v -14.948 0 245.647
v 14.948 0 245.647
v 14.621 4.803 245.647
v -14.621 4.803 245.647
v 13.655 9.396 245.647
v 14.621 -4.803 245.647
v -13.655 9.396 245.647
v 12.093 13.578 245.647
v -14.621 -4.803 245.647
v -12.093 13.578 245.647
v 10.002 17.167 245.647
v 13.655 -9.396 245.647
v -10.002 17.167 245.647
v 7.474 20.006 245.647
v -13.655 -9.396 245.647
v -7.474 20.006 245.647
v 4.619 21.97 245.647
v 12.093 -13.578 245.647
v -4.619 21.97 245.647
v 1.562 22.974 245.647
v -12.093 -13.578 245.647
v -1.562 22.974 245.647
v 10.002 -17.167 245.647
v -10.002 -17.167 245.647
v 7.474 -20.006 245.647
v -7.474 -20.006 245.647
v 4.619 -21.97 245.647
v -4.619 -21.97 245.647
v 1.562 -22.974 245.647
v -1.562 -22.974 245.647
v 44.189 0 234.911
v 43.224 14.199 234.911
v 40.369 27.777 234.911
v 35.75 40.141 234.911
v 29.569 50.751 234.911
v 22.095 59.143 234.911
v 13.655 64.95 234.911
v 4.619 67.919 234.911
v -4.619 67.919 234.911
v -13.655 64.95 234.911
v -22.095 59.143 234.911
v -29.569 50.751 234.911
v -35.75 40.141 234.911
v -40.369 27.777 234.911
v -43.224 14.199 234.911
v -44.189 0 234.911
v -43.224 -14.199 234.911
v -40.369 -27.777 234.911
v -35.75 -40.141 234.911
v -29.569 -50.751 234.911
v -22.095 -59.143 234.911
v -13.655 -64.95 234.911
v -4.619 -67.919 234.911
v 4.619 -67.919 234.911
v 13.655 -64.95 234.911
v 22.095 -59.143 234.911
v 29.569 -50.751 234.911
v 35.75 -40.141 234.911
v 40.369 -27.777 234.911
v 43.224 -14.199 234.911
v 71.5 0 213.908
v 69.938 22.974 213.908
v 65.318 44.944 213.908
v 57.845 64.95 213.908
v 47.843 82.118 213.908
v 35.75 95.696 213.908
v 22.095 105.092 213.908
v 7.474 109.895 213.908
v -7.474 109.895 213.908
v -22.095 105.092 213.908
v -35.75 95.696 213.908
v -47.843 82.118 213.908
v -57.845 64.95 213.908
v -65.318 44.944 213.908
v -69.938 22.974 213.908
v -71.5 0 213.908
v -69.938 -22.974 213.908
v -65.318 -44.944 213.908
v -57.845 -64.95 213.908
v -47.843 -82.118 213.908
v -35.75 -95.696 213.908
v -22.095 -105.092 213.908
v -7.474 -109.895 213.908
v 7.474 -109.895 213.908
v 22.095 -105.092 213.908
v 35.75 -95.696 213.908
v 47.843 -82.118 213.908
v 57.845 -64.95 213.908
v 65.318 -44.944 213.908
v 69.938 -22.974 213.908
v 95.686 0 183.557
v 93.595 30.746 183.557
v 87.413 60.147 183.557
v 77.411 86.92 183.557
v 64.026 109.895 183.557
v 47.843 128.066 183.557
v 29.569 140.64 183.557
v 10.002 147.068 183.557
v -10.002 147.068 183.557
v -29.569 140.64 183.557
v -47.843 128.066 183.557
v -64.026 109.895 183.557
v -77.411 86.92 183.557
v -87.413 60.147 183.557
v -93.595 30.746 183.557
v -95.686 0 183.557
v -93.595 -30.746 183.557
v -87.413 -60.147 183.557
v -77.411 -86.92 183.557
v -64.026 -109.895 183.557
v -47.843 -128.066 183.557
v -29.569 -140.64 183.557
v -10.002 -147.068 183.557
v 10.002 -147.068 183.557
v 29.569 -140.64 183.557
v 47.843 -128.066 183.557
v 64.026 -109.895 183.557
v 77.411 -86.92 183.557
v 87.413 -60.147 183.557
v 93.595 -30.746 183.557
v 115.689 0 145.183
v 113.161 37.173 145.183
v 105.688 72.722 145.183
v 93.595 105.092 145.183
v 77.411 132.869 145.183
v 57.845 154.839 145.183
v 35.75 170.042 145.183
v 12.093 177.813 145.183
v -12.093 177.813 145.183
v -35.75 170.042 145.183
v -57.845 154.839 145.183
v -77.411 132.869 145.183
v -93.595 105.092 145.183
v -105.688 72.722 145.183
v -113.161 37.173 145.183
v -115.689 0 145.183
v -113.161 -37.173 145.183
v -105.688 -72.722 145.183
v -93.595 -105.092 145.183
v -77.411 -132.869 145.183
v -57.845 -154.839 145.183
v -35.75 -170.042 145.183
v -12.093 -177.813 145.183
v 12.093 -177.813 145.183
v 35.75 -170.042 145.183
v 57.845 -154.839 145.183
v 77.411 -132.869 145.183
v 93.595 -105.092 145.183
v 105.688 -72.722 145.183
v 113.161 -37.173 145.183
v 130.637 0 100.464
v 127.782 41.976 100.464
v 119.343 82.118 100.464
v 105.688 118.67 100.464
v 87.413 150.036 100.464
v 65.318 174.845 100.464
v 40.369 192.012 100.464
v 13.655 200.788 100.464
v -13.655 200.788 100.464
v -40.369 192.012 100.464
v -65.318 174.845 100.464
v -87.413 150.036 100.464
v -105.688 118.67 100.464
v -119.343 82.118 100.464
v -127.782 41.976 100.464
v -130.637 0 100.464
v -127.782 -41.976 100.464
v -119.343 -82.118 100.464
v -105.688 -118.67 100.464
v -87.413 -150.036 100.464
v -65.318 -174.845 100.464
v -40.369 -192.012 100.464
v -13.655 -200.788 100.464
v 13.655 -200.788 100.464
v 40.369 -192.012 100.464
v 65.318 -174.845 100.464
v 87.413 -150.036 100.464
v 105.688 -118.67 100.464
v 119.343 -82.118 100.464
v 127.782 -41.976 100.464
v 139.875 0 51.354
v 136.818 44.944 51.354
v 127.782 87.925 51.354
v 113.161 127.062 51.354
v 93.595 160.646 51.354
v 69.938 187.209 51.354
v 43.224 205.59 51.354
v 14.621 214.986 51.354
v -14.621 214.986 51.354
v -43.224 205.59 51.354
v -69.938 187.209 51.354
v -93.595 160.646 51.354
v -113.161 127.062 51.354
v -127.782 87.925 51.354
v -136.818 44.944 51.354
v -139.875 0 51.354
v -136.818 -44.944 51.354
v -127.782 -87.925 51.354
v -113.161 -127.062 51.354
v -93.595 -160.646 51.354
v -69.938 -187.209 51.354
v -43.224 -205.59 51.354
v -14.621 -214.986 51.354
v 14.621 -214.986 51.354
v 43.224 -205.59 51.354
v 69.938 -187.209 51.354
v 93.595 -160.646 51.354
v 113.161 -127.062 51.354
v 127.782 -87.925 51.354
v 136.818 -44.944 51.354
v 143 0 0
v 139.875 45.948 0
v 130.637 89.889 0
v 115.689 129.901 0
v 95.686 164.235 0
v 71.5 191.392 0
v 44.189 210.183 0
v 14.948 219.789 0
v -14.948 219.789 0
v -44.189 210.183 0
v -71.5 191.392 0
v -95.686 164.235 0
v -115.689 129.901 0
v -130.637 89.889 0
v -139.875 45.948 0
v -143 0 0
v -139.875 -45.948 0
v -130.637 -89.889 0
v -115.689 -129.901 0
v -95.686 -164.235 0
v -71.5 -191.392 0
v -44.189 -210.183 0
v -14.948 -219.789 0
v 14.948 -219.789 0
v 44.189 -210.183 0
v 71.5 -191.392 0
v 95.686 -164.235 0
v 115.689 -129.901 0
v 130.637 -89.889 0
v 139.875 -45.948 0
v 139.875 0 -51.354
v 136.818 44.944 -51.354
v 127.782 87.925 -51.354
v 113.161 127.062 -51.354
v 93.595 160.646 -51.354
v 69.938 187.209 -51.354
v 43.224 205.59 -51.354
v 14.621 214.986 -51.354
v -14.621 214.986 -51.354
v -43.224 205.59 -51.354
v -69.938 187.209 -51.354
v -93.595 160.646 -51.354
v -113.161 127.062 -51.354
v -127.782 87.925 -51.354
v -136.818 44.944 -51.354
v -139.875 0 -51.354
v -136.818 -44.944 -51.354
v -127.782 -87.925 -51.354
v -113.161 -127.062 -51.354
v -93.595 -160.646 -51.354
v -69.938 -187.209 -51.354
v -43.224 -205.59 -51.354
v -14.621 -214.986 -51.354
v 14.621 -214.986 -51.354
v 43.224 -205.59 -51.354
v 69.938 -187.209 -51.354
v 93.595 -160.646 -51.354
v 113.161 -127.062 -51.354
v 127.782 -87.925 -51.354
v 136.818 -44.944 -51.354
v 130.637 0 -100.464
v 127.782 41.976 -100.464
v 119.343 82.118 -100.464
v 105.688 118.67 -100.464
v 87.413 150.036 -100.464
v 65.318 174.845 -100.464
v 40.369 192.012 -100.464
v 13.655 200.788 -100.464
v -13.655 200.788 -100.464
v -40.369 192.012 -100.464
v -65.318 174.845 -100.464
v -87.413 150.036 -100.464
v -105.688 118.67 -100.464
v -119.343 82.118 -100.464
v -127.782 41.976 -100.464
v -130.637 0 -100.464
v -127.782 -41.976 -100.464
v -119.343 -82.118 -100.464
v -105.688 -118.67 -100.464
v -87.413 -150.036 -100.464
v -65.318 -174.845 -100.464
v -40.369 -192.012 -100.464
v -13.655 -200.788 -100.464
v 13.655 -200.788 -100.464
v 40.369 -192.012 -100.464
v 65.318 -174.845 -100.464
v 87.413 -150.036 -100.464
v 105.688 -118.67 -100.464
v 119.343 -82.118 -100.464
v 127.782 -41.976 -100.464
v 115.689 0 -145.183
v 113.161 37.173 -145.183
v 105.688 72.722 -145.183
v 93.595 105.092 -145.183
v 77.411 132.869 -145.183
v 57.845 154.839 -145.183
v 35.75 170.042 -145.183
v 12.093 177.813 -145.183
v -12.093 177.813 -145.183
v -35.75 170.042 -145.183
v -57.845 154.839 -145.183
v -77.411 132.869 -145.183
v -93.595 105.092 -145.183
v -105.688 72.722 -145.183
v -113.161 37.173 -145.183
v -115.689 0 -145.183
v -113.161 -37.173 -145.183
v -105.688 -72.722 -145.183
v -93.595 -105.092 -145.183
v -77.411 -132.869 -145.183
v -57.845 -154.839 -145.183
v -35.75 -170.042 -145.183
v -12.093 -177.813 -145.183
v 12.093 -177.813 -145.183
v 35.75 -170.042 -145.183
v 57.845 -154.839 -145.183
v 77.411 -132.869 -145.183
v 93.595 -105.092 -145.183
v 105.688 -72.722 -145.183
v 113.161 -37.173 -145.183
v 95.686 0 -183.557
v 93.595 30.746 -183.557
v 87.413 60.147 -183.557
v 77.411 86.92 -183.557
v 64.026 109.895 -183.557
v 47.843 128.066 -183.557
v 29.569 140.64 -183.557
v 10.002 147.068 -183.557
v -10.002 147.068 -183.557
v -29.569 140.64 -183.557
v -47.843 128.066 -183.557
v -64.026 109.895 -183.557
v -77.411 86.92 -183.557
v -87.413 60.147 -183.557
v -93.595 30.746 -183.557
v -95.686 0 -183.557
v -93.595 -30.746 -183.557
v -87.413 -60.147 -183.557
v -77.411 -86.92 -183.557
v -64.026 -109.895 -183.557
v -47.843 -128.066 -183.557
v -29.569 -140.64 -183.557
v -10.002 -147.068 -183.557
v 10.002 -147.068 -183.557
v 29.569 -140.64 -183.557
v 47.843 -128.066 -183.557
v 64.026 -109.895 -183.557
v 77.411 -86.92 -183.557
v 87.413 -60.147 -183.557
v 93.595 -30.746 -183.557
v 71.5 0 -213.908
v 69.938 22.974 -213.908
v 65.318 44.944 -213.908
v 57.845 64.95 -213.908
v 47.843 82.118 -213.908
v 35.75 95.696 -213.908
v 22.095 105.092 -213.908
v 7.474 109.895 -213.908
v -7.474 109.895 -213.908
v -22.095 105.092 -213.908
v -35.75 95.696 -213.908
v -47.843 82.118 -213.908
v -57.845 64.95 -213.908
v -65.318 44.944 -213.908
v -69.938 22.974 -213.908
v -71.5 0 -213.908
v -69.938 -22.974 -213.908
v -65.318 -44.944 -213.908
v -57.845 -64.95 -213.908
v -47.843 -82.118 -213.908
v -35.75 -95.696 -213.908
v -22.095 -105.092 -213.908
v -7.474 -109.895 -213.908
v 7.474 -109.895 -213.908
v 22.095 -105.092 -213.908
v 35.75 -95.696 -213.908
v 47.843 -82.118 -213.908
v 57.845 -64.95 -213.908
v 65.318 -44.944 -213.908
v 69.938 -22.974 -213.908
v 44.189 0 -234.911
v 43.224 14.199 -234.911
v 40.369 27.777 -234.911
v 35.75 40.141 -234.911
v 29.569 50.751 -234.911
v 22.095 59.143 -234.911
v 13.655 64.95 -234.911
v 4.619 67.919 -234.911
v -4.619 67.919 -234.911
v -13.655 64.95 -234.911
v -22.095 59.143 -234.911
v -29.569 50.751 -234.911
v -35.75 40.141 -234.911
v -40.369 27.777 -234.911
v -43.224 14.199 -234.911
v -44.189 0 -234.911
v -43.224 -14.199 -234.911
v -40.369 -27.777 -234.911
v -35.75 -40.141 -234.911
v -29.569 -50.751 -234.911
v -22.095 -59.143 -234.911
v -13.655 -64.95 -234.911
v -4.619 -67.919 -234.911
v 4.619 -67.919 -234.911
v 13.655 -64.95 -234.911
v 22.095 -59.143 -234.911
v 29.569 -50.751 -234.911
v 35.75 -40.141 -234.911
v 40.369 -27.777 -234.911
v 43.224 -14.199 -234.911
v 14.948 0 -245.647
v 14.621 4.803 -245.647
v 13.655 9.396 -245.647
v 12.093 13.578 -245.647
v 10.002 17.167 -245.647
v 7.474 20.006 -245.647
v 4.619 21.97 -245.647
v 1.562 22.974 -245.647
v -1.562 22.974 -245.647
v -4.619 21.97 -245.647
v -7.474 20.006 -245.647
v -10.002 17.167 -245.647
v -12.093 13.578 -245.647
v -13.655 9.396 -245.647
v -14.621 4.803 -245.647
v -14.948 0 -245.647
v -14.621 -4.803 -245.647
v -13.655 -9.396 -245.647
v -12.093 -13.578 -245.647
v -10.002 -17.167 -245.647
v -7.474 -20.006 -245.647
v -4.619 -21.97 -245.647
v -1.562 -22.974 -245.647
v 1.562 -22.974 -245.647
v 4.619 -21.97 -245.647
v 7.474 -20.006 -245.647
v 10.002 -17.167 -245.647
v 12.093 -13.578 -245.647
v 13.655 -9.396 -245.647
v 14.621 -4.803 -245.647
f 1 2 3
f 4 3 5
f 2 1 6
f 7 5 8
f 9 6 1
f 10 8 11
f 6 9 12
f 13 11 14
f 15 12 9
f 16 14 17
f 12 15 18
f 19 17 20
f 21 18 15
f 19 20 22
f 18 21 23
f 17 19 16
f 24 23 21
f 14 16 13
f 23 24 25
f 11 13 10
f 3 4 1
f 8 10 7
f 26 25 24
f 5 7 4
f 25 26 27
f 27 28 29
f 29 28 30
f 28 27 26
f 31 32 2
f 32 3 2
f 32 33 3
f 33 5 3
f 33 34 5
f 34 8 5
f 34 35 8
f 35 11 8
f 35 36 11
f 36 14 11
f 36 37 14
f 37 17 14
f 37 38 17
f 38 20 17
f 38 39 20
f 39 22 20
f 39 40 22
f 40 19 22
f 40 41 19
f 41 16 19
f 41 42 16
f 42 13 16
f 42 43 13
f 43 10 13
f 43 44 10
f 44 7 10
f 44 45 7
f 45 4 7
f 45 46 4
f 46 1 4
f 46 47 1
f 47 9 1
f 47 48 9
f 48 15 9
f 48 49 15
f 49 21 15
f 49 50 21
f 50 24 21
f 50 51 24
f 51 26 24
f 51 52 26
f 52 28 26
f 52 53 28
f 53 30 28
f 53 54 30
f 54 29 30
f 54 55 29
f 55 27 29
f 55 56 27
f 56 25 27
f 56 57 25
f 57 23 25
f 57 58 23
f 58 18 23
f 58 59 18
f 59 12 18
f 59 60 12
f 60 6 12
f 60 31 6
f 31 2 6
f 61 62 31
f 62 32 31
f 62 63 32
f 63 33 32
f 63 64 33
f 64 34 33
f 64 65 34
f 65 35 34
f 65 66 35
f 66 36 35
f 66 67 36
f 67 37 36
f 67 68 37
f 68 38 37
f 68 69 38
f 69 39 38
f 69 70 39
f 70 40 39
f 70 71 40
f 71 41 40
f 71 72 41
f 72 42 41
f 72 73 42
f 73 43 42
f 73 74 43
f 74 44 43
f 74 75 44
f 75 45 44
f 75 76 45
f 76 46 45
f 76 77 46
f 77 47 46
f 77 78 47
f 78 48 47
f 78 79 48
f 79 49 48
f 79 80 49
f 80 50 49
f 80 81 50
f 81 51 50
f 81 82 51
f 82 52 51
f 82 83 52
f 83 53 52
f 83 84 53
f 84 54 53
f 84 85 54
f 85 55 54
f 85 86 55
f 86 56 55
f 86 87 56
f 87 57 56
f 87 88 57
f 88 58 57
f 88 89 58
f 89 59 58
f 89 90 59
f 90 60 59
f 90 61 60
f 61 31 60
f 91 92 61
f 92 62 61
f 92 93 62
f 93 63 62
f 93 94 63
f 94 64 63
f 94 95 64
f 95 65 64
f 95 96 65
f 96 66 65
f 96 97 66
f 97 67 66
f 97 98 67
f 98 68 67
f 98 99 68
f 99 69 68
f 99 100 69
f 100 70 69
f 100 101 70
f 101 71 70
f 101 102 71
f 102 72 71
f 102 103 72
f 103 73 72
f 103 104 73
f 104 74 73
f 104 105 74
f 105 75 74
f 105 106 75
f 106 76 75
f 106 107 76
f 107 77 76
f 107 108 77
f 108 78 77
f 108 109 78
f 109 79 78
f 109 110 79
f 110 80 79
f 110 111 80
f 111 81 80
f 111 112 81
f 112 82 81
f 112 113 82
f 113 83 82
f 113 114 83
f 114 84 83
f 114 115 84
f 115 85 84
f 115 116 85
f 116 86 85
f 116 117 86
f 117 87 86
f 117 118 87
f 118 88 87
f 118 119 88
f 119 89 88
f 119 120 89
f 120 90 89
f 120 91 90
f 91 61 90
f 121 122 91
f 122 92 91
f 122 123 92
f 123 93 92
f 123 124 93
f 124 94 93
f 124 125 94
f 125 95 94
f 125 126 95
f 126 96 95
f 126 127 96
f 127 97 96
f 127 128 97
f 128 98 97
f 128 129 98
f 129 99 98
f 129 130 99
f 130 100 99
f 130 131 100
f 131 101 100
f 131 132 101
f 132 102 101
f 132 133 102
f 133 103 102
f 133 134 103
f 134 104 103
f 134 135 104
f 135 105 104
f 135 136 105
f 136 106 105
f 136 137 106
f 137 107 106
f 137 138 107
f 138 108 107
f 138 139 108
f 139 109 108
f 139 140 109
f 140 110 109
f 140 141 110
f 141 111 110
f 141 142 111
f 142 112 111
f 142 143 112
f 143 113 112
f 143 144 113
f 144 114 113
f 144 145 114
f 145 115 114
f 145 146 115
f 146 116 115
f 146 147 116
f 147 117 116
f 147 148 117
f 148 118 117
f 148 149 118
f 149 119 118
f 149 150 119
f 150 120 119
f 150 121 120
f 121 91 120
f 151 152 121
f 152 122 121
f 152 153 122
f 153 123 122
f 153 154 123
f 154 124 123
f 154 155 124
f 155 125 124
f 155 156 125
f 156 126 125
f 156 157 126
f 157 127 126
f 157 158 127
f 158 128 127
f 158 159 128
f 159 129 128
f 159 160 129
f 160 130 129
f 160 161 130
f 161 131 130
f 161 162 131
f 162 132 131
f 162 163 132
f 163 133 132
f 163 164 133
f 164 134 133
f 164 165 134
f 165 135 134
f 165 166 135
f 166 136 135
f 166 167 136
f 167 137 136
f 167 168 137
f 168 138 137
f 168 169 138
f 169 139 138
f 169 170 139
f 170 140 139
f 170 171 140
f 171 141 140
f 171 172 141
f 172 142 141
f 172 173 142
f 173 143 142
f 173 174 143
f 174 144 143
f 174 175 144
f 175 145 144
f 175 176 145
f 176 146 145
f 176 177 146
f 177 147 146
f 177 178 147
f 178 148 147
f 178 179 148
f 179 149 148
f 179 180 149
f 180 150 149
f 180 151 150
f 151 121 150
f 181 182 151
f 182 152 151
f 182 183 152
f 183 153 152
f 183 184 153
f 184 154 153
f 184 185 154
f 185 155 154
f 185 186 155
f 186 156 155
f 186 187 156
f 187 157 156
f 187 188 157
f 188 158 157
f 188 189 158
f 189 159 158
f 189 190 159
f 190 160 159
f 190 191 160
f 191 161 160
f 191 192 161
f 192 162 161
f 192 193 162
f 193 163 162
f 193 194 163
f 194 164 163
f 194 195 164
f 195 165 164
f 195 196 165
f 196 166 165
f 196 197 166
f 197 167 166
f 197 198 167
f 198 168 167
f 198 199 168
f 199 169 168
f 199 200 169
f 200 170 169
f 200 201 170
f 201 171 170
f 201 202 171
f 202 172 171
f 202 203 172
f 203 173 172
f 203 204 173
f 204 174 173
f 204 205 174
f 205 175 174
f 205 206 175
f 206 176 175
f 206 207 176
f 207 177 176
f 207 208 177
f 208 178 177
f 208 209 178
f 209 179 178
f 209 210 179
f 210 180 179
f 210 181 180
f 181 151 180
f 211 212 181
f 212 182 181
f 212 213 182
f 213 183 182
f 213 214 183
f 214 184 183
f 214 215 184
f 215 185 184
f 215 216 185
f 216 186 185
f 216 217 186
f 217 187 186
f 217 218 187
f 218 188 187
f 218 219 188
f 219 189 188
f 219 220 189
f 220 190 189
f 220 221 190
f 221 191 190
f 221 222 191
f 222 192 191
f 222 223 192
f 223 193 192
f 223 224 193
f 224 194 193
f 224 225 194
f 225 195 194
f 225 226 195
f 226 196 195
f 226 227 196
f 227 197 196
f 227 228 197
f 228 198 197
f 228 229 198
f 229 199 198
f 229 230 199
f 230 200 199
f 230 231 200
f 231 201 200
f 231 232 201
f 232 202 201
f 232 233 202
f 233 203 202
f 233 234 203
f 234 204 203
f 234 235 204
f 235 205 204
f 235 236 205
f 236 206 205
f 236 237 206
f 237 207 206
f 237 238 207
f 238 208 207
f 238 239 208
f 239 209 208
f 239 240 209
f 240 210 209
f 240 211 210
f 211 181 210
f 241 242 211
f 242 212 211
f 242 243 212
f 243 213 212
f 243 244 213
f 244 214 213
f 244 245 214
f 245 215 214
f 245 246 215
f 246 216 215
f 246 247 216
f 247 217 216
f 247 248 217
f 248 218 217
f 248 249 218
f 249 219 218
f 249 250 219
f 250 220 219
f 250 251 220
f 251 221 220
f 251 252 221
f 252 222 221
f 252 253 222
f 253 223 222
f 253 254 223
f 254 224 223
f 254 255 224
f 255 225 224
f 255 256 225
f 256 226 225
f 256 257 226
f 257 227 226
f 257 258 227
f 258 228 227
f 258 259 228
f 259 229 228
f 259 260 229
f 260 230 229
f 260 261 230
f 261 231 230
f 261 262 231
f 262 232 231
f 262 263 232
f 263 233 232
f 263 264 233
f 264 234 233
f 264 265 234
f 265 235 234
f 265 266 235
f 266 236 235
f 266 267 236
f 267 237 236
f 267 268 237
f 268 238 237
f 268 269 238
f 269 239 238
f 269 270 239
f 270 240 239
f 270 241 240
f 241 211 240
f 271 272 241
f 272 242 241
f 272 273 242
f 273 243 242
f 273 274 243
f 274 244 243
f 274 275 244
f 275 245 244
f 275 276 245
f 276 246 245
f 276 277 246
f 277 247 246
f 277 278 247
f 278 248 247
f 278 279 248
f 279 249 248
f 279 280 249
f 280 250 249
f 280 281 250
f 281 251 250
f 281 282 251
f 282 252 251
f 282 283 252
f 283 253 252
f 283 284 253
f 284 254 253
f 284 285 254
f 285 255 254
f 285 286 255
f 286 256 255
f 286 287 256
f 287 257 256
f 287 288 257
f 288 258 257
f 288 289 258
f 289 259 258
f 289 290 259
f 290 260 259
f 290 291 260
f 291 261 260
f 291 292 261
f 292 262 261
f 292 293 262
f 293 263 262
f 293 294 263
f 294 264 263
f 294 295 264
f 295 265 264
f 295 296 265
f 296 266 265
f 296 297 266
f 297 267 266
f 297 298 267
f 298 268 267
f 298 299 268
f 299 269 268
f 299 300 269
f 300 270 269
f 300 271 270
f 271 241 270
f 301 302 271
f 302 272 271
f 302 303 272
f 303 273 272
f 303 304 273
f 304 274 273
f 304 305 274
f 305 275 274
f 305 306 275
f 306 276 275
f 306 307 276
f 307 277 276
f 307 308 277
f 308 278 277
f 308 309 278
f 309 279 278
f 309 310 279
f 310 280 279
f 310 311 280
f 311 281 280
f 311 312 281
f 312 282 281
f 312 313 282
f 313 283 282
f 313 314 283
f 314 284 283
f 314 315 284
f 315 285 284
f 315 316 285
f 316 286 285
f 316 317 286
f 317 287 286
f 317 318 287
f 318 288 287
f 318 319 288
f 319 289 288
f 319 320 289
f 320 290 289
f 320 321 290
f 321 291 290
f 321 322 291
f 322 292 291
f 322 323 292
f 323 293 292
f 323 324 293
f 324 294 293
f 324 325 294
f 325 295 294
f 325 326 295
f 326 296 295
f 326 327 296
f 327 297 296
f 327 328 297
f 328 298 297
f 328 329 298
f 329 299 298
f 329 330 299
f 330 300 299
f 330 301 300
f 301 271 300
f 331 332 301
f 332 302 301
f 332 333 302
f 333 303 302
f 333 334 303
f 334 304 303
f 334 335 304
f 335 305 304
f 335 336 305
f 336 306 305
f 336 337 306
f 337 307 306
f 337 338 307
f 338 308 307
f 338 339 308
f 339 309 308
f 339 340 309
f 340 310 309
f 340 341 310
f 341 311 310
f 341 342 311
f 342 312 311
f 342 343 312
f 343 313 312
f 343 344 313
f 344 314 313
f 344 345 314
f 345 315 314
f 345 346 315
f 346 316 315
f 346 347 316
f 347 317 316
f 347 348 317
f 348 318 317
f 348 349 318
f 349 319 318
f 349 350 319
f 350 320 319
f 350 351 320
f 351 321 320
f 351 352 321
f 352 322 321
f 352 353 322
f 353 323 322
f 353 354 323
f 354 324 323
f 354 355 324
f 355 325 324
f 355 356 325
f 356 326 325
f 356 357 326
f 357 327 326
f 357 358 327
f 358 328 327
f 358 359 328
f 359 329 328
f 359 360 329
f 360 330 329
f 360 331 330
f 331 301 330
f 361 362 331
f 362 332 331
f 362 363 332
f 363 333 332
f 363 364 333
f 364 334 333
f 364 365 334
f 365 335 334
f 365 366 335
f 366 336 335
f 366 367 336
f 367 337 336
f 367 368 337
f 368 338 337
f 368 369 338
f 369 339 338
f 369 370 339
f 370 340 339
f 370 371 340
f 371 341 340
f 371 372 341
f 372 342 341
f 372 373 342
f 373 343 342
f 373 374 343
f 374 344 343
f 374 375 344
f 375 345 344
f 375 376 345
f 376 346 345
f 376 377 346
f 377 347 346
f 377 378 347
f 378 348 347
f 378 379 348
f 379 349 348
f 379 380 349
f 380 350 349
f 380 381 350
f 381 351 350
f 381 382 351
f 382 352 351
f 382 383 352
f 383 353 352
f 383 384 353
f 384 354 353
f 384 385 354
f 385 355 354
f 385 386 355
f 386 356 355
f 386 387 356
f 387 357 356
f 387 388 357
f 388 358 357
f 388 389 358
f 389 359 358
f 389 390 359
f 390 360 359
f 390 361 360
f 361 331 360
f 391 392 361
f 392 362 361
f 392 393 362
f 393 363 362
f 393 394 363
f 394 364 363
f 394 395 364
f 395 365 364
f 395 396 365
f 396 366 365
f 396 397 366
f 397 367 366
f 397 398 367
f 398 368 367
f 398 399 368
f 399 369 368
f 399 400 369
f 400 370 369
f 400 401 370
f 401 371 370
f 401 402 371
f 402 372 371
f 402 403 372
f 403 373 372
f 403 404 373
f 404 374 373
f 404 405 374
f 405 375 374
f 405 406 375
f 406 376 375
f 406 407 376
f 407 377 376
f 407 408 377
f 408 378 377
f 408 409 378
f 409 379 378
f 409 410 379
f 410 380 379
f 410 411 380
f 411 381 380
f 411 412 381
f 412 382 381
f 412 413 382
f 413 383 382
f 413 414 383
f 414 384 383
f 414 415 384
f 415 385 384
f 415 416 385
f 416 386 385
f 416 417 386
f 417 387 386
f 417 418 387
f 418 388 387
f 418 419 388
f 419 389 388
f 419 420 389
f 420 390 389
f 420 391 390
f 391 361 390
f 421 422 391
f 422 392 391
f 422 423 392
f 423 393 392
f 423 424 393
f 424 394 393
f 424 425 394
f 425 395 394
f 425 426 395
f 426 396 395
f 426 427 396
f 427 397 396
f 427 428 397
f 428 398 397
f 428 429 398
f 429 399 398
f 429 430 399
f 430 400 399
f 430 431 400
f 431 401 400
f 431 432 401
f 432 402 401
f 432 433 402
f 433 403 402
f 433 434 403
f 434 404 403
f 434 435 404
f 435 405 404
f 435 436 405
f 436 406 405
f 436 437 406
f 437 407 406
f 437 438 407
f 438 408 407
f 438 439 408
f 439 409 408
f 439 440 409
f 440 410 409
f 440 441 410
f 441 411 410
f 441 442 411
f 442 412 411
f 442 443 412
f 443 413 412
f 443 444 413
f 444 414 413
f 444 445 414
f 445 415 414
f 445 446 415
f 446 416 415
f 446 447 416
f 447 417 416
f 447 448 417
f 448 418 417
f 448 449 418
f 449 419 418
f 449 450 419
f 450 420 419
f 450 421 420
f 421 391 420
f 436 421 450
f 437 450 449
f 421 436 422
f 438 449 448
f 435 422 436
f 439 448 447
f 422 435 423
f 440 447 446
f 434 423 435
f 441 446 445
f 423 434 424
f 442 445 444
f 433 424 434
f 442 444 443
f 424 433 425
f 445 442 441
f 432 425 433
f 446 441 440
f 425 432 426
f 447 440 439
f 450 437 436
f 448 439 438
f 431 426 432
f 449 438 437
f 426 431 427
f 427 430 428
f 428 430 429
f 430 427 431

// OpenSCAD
// Generated by SolidPython 1.0.1 on 2020-07-29 00:46:50


scale(v = [11, 17, 19]) {
	sphere(r = 13);
}
/***********************************************
*********      SolidPython code:      **********
************************************************
 
# import packages: SolidPython
from solid import *
from solid.utils import *
from itertools import chain, combinations, permutations


class Resize:

    def __init__(self, scad_file):
        self.scad_file = scad_file
        #self.scad_file = import_scad(scad_file)
        # cone/cylinder param:
        self.r1 = 0
        self.r2 = 0
        self.h = 0
        # rectangular prism param:
        self.w = 0
        self.l = 0
        # ellipse param:
        self.r = 0

    # import OpenScad code (file name corresponds to shape)


    # classify shape + parameters
    def assign(self, param1, param2, param3):
        if self.scad_file == 'cone.scad':
            self.r1 = param1
            self.r2 = param2
            self.h = param3
        elif self.scad_file == 'cylinder.scad':
            self.r1 = param1
            self.r2 = param2
            self.h = param3
        elif self.scad_file == 'rectangularPrism.scad':
            self.h = param1
            self.l = param2
            self.w = param3
        else:
            self.r = param1
            self.h = param2

    # resize parameters
    def iterate(self):
        x = range(3, 20, 2)
        i = 1
        if self.scad_file == 'cone.scad':
            tempList = list(permutations(x, 2))
            for temp in tempList:
                param1 = temp[0]
                param2 = temp[1]
                filepath = 'produced_scad_files/' + 'cone' + str(param1) + '_' + str(param2) + '_' + '.scad'
                scad_render_to_file(cylinder(h=param1, r1=param2, r2=0), filepath)

        elif self.scad_file == 'cylinder.scad':
            tempList = list(permutations(x, 3))
            for temp in tempList:
                param1 = temp[0]
                param2 = temp[1]
                filepath = 'produced_scad_files/' + 'cylinder' + str(param1) + '_' + str(param2) + '_' + '.scad'
                scad_render_to_file(cylinder(h=param1, r1=param2, r2=param2), filepath)

        elif self.scad_file == 'rectangularPrism.scad':
            tempList = list(permutations(x, 3))
            for temp in tempList:
                param1 = temp[0]
                param2 = temp[1]
                param3 = temp[2]
                filepath = 'produced_scad_files/' + 'rectangularPrism' + str(param1) + '_' + str(param2) + '_' + str(
                    param3) + '.scad'
                scad_render_to_file(cube(size=(param1, param2, param3)), filepath)

        elif self.scad_file == 'ellipse.scad':
            tempList = list(permutations(x, 4))
            for temp in tempList:
                param1 = temp[0]
                param2 = temp[1]
                param3 = temp[2]
                param4 = temp[3]
                filepath = 'produced_scad_files/' + 'ellipse' + str(param1) + '_' + str(param2) + '_' + str(param3) + '_' + str(param4) + '.scad'
                scad_render_to_file(scale([param1, param2, param3])(sphere(r=param4)), filepath)

    def render_to_scadfile(self):
        scad_render_to_file(scad, 'example.scad') 
 
************************************************/
